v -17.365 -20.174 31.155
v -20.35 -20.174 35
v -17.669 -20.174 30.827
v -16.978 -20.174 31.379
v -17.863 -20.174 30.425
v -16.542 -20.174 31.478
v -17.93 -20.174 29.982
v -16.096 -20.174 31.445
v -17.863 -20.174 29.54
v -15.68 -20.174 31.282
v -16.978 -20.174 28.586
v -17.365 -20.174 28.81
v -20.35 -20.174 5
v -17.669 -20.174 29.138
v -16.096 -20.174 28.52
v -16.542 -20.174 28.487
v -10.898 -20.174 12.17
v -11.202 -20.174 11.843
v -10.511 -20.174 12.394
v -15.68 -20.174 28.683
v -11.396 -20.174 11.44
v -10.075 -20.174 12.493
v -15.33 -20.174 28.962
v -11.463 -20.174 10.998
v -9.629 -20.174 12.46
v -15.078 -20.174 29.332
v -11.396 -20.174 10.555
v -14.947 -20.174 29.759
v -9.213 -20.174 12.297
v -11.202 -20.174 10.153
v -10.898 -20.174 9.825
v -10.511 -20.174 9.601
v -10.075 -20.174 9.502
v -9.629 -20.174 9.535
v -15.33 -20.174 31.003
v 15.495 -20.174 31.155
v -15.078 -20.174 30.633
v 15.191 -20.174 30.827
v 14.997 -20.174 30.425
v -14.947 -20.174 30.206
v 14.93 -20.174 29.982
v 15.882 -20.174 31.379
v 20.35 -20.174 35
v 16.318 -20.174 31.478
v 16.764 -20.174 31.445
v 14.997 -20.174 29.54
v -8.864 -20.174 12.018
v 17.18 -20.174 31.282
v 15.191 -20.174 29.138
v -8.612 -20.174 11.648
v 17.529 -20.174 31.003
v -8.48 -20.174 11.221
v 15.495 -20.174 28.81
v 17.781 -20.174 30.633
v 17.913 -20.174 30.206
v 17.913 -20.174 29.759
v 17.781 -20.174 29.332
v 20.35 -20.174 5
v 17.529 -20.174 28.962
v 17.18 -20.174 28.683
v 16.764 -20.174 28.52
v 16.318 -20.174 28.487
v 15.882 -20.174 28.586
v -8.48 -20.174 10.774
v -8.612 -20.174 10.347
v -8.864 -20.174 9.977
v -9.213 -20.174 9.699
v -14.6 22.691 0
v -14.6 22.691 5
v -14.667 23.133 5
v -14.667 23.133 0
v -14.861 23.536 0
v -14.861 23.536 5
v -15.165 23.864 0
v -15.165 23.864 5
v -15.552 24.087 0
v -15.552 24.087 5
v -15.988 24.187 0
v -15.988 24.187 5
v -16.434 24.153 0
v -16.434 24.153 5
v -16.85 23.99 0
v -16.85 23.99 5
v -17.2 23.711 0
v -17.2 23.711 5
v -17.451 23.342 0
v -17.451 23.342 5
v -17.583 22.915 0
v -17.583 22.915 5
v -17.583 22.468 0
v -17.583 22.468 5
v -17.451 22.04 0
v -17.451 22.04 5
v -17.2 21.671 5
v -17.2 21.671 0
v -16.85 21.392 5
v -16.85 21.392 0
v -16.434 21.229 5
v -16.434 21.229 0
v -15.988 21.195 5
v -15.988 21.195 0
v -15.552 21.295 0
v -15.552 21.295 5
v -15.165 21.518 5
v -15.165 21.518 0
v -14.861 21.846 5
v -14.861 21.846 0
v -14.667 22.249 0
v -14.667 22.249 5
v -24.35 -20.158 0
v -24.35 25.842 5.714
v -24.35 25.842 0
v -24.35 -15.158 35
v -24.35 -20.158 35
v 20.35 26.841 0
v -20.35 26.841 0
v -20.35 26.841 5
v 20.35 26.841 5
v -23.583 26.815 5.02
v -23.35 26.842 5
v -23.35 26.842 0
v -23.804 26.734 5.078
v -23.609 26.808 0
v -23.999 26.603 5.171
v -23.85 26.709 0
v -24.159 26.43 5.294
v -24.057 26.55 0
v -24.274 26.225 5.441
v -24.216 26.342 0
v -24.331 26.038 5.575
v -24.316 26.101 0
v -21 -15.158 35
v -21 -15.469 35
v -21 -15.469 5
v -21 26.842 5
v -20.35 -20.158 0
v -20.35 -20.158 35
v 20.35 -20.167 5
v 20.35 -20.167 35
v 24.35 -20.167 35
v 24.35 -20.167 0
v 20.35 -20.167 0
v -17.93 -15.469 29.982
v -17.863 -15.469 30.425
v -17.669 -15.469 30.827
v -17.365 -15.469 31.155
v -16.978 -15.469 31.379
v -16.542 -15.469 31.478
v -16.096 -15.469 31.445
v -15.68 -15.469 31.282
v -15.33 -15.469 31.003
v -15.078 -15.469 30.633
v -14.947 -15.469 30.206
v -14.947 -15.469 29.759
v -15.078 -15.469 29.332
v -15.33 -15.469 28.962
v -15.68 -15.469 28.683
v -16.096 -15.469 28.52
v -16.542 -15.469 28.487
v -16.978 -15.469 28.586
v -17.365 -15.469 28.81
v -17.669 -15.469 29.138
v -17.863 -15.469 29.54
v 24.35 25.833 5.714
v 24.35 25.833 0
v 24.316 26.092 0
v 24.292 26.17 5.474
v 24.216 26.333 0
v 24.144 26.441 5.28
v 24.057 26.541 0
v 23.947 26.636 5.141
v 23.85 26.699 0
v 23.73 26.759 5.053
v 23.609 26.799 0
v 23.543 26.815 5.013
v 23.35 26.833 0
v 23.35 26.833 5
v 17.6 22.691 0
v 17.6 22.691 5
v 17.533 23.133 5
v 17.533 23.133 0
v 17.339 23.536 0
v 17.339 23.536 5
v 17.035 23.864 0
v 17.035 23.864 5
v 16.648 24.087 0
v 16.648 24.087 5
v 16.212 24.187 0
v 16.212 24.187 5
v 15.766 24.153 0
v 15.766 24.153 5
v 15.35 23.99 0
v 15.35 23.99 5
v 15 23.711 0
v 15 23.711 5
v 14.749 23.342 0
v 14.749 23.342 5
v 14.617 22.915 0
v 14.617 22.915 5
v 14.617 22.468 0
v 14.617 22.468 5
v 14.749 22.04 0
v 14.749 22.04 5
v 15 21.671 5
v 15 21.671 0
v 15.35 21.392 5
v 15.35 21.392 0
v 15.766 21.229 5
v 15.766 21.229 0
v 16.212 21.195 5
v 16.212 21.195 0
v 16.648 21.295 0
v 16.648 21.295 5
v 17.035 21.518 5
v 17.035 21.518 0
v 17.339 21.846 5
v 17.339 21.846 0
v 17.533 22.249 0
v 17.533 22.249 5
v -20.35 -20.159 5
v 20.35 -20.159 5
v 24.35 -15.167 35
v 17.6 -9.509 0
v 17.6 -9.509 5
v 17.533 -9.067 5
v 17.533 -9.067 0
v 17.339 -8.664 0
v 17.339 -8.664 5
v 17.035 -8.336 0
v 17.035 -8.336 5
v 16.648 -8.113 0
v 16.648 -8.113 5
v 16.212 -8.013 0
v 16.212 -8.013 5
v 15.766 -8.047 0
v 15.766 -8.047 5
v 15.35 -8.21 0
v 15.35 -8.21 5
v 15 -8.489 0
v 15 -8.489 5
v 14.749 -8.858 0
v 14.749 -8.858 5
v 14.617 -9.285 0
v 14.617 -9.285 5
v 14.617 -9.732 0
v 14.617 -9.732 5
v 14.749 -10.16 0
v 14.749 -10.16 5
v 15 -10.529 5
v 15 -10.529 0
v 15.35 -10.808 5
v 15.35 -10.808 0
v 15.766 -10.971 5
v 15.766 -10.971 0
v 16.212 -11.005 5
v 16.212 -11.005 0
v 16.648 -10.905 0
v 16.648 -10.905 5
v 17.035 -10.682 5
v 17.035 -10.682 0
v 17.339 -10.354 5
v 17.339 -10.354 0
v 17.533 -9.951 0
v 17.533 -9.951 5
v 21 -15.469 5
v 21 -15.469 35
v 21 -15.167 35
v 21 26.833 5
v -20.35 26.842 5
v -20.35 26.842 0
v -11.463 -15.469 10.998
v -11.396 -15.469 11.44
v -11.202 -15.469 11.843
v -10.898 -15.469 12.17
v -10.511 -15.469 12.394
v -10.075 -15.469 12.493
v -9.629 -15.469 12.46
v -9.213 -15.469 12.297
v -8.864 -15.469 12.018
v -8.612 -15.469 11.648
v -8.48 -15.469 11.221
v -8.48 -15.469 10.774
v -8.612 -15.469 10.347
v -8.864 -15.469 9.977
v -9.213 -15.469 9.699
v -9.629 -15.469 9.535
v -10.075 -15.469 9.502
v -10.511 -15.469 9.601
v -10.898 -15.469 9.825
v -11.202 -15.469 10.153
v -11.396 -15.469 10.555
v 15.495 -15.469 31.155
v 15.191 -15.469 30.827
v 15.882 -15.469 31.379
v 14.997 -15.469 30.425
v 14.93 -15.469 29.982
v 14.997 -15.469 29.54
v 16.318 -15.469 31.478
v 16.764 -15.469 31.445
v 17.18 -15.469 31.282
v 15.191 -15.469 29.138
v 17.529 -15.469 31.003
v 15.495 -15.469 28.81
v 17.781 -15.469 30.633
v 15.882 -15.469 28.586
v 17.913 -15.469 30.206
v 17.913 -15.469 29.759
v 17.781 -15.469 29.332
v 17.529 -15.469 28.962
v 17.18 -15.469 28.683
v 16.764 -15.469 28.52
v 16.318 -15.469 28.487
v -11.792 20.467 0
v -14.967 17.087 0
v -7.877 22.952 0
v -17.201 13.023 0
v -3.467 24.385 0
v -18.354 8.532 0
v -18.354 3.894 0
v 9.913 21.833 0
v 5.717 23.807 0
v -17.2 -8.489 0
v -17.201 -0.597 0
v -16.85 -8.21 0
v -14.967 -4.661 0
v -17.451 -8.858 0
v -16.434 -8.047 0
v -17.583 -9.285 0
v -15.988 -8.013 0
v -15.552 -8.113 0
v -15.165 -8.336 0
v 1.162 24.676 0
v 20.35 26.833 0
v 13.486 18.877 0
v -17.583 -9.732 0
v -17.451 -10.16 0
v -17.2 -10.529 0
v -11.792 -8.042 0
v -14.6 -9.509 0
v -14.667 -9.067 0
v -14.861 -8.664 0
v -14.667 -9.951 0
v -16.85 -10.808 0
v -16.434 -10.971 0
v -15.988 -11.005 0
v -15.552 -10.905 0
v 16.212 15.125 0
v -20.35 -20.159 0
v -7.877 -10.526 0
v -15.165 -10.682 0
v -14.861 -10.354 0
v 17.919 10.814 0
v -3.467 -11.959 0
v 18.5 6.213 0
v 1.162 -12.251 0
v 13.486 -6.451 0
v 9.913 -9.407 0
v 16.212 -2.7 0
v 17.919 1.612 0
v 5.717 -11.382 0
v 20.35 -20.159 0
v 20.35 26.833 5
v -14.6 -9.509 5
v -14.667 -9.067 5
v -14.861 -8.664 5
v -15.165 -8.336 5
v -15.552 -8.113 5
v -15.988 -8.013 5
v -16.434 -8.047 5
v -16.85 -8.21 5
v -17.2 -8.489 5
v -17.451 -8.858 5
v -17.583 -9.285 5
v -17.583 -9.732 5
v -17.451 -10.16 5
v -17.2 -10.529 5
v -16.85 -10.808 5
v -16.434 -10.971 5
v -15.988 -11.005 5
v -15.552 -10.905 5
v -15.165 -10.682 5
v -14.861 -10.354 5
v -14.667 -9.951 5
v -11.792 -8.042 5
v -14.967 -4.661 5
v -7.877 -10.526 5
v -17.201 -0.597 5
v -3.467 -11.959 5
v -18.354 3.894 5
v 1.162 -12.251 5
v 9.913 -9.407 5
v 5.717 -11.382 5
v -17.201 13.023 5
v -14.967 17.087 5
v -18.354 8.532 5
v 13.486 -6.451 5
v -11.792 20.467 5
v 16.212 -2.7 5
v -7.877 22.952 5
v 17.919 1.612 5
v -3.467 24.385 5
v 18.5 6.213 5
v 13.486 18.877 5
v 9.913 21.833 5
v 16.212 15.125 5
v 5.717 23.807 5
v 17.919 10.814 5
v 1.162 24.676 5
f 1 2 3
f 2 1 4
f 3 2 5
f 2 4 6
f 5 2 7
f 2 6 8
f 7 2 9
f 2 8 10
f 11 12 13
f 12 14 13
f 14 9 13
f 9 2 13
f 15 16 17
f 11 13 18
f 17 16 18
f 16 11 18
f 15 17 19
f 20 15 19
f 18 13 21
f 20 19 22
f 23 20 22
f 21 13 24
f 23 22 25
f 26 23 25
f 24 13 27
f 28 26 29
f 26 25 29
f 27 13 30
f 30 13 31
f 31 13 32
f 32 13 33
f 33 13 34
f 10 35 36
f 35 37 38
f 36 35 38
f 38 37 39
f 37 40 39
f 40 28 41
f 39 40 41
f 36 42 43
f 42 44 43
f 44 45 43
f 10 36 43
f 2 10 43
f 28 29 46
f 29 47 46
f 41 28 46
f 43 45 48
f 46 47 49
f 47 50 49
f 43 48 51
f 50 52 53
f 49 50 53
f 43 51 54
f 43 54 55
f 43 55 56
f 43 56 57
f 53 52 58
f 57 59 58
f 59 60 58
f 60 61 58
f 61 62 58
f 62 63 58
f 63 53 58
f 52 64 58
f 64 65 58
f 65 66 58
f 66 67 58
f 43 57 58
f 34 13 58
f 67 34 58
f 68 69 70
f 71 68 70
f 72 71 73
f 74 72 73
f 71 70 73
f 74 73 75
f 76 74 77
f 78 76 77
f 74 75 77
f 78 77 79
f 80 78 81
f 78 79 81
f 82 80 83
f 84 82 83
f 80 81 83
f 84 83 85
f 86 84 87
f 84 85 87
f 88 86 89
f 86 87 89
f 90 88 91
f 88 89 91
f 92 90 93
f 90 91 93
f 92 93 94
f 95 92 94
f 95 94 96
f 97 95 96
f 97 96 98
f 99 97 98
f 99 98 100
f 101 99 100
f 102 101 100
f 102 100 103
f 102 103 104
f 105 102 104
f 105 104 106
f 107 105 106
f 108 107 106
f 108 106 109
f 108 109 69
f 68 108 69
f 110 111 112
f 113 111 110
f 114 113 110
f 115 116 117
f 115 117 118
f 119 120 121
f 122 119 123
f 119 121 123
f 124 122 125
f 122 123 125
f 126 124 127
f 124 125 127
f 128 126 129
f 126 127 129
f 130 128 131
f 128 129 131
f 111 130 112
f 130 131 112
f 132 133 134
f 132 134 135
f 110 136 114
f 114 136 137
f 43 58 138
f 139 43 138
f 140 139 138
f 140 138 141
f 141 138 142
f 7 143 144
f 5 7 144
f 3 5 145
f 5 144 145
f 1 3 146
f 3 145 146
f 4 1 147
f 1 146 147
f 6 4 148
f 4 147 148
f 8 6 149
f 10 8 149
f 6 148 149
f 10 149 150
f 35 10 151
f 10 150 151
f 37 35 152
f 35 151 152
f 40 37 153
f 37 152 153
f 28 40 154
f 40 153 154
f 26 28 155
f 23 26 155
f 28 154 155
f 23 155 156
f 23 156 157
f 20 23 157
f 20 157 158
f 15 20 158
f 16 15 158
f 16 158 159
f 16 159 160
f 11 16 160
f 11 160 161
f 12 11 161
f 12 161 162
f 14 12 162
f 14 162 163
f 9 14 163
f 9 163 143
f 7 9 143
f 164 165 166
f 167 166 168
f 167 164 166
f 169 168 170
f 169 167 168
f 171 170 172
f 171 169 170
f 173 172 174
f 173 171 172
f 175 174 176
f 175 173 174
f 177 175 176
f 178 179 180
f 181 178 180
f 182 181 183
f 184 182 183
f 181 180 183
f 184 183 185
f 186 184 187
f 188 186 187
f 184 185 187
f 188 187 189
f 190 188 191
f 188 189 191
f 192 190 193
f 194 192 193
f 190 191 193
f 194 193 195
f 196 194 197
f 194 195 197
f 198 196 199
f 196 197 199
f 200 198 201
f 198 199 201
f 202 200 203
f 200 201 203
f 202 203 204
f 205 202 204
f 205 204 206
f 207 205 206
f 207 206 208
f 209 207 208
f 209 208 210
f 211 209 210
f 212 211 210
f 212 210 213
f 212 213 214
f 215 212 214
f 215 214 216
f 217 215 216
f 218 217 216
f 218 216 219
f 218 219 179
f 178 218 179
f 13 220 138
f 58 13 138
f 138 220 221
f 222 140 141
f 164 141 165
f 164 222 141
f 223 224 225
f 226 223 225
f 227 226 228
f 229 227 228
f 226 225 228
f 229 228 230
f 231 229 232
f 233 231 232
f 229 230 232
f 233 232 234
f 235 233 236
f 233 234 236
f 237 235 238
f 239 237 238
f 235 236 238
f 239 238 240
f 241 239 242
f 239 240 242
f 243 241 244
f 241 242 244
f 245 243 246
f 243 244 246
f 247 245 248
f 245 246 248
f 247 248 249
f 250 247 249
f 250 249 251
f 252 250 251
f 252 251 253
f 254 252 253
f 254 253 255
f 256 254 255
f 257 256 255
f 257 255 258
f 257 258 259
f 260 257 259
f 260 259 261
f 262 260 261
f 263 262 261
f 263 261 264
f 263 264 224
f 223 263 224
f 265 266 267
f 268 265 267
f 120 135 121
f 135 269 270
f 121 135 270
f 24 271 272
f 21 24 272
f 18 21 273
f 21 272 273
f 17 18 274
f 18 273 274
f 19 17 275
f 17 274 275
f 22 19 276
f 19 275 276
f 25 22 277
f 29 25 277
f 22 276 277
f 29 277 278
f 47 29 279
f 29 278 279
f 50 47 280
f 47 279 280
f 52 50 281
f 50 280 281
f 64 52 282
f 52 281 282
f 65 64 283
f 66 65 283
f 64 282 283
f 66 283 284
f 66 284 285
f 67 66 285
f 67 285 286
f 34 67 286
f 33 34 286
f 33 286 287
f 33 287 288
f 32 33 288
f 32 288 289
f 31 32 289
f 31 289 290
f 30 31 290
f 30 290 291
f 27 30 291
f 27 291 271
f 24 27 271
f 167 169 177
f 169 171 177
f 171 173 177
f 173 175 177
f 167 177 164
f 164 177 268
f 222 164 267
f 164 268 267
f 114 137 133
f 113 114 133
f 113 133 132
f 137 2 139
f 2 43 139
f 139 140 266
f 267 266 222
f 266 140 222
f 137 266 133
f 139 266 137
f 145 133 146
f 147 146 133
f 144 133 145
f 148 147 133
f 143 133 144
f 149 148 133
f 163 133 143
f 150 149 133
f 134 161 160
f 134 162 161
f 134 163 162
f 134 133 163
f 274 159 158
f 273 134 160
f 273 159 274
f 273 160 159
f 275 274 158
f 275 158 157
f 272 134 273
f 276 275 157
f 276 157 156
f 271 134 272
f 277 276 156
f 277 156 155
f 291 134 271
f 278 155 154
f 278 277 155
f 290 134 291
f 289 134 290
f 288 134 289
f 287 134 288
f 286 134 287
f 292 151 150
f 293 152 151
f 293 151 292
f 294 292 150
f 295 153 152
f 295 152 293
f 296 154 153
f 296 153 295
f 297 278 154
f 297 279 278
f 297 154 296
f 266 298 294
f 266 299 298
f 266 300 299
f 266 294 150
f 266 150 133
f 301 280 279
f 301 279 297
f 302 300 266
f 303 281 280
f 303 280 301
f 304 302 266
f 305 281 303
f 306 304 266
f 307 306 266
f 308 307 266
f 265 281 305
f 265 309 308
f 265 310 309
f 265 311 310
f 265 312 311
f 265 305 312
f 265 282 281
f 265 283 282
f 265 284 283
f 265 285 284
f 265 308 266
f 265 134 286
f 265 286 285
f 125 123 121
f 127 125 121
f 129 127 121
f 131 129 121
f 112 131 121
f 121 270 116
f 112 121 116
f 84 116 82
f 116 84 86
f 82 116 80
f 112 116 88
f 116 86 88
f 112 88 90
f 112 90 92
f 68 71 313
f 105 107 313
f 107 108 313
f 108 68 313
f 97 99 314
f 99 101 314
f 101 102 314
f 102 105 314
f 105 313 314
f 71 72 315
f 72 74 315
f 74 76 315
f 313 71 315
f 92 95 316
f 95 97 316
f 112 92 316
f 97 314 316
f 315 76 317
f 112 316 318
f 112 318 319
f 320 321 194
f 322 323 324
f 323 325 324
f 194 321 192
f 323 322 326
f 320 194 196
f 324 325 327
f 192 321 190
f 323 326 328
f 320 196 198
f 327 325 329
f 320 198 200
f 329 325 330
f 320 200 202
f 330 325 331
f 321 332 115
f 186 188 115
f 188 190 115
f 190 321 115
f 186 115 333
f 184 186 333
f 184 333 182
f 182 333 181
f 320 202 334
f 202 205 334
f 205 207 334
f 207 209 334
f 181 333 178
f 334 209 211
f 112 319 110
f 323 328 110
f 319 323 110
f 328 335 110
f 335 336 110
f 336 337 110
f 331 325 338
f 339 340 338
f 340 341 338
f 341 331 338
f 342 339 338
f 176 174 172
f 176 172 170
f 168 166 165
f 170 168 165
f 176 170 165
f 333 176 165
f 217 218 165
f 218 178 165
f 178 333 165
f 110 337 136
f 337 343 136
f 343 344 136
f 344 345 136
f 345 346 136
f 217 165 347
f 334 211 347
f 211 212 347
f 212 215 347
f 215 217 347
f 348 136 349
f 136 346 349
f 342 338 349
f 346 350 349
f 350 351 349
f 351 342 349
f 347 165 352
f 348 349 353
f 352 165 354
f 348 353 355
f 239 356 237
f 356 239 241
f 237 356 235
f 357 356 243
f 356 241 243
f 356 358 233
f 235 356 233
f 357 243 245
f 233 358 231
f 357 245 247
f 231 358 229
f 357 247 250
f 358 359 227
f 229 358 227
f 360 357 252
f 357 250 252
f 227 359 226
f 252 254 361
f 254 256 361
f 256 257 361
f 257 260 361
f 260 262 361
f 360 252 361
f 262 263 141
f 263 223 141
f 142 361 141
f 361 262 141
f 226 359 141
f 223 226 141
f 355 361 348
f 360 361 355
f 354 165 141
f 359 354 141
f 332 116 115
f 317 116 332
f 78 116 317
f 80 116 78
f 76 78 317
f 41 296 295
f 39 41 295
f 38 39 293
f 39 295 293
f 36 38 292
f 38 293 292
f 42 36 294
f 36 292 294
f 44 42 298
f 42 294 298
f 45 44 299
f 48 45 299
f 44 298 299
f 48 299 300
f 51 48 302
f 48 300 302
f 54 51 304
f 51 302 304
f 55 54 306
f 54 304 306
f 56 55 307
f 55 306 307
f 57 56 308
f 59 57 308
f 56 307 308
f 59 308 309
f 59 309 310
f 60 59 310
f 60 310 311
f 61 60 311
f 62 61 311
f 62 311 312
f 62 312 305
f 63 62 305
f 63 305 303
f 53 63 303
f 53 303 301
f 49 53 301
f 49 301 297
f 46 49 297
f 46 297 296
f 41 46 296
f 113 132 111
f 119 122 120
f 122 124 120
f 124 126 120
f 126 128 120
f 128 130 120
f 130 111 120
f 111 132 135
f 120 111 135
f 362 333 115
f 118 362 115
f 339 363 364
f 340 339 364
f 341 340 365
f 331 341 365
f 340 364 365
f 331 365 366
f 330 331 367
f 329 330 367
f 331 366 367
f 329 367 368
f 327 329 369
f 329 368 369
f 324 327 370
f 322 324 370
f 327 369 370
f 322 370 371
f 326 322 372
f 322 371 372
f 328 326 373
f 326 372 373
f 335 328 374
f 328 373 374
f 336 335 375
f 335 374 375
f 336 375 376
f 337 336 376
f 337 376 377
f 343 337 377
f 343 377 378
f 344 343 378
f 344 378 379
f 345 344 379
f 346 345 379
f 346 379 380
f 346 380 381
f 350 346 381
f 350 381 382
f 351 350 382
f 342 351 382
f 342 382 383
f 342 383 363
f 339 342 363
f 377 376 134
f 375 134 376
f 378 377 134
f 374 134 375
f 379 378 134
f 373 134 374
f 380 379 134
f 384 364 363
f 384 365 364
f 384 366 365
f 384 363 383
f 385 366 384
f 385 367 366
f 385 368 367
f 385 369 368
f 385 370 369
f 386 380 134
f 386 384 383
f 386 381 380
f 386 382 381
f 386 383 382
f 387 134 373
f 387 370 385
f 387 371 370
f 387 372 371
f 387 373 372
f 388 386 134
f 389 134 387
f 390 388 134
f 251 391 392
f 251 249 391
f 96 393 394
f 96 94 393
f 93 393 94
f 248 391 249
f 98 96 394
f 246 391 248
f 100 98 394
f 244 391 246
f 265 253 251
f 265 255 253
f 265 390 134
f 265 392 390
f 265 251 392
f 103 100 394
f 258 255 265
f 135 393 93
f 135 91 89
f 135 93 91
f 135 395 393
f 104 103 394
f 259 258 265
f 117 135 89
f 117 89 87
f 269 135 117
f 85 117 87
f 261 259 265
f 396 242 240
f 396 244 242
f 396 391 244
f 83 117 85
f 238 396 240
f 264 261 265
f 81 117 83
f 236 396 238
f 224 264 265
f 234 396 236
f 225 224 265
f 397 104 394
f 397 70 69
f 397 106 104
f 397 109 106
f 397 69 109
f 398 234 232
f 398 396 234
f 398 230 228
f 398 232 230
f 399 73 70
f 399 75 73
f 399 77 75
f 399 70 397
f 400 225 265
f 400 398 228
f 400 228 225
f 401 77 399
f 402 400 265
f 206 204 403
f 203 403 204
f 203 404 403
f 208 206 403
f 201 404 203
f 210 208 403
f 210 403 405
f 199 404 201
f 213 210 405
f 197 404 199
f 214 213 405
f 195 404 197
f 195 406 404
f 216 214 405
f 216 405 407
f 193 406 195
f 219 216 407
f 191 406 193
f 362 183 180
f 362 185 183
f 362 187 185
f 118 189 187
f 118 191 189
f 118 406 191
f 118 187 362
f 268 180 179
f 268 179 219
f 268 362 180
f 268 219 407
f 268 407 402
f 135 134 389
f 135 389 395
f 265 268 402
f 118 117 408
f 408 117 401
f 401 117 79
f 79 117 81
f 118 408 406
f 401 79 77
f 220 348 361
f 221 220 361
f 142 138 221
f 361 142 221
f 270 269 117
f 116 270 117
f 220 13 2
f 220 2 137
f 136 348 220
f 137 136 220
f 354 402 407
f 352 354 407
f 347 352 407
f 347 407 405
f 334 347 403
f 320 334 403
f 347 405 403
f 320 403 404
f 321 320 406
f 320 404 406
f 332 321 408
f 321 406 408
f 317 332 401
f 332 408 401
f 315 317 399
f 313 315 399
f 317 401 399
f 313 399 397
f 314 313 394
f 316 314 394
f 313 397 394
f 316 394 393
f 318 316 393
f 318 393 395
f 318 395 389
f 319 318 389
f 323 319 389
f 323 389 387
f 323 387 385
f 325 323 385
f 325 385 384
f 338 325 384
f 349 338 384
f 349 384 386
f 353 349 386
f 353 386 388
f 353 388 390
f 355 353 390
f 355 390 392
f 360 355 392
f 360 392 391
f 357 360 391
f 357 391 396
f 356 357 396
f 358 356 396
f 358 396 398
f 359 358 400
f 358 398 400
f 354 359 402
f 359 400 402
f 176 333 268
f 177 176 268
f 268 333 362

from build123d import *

# Parameters (mm, degrees)
SKETCH_W        = 40.7
SKETCH_H        = 47
PAD_DEPTH       = 5
SKETCH001_R     = 18.5
POCKET_DEPTH    = 5.001
SKETCH002_R     = 1.5
POCKET001_DEPTH = 5.001
SKETCH003_W     = 40.7
SKETCH003_H     = 5
PAD001_DEPTH    = 30
SKETCH004_R     = 1.5
POCKET002_DEPTH = 5
PAD002_DEPTH    = 4
PAD003_DEPTH    = 4
SKETCH007_W     = 42
SKETCH007_H     = 44.033375
POCKET003_DEPTH = 32
FILLET_R        = 1


with BuildPart() as part:
    # Sketch → Pad (new body)
    with BuildSketch(Plane.XY):
        with Locations((0, 3.341403)):
            Rectangle(SKETCH_W, SKETCH_H)
    extrude(amount=PAD_DEPTH)

    # Sketch001 → Pocket (cut, through all)
    with BuildSketch(Plane.XY.offset(5)):
        with Locations((0, 6.2129)):
            Circle(SKETCH001_R)
    extrude(amount=-POCKET_DEPTH, mode=Mode.SUBTRACT)

    # Sketch002 → Pocket001 (cut, through all)
    with BuildSketch(Plane.XY.offset(5)):
        with Locations((-16.1, 22.6911)):
            Circle(SKETCH002_R)
        with Locations((16.1, 22.6911)):
            Circle(SKETCH002_R)
        with Locations((16.1, -9.5089)):
            Circle(SKETCH002_R)
        with Locations((-16.1, -9.5089)):
            Circle(SKETCH002_R)
    extrude(amount=-POCKET001_DEPTH, mode=Mode.SUBTRACT)

    # Sketch003 → Pad001 (new body)
    with BuildSketch(Plane.XY.offset(5)):
        with Locations((0, -17.674198)):
            Rectangle(SKETCH003_W, SKETCH003_H)
    extrude(amount=PAD001_DEPTH)

    # Sketch004 → Pocket002 (cut)
    with BuildSketch(Plane(origin=(0, -15.174198, 0), x_dir=(-1, 0, 0), z_dir=(0, 1, 0))):
        with Locations((9.963108, 10.997544)):
            Circle(SKETCH004_R)
        with Locations((-16.42986, 29.9825)):
            Circle(SKETCH004_R)
        with Locations((16.42986, 29.9825)):
            Circle(SKETCH004_R)
    extrude(amount=-POCKET002_DEPTH, mode=Mode.SUBTRACT)

    # Sketch005 → Pad002 (new body)
    with BuildSketch(Plane.YZ.offset(20.35)):
        Polygon((-20.1666, 0), (26.8334, 0), (26.8334, 5), (-15.1666, 35), (-20.1666, 35), align=None)
    extrude(amount=PAD002_DEPTH)

    # Sketch006 → Pad003 (new body)
    with BuildSketch(Plane(origin=(-20.35, 0, 0), x_dir=(0, -1, 0), z_dir=(-1, 0, 0))):
        Polygon((-26.8425, 0), (20.1575, 0), (20.1575, 35), (15.1575, 35), (-26.8425, 5), align=None)
    extrude(amount=PAD003_DEPTH)

    # Sketch007 → Pocket003 (cut)
    with BuildSketch(Plane.XY.offset(5)):
        with Locations((0, 6.547751)):
            Rectangle(SKETCH007_W, SKETCH007_H)
    extrude(amount=POCKET003_DEPTH, mode=Mode.SUBTRACT)

    # Fillet
    fillet_edges = [part.edges().sort_by_distance(p)[0] for p in [
        (-24.35, 26.8425, 2.5),
        (24.35, 26.8334, 2.5),
    ]]
    fillet(fillet_edges, radius=FILLET_R)


solid = part.part
